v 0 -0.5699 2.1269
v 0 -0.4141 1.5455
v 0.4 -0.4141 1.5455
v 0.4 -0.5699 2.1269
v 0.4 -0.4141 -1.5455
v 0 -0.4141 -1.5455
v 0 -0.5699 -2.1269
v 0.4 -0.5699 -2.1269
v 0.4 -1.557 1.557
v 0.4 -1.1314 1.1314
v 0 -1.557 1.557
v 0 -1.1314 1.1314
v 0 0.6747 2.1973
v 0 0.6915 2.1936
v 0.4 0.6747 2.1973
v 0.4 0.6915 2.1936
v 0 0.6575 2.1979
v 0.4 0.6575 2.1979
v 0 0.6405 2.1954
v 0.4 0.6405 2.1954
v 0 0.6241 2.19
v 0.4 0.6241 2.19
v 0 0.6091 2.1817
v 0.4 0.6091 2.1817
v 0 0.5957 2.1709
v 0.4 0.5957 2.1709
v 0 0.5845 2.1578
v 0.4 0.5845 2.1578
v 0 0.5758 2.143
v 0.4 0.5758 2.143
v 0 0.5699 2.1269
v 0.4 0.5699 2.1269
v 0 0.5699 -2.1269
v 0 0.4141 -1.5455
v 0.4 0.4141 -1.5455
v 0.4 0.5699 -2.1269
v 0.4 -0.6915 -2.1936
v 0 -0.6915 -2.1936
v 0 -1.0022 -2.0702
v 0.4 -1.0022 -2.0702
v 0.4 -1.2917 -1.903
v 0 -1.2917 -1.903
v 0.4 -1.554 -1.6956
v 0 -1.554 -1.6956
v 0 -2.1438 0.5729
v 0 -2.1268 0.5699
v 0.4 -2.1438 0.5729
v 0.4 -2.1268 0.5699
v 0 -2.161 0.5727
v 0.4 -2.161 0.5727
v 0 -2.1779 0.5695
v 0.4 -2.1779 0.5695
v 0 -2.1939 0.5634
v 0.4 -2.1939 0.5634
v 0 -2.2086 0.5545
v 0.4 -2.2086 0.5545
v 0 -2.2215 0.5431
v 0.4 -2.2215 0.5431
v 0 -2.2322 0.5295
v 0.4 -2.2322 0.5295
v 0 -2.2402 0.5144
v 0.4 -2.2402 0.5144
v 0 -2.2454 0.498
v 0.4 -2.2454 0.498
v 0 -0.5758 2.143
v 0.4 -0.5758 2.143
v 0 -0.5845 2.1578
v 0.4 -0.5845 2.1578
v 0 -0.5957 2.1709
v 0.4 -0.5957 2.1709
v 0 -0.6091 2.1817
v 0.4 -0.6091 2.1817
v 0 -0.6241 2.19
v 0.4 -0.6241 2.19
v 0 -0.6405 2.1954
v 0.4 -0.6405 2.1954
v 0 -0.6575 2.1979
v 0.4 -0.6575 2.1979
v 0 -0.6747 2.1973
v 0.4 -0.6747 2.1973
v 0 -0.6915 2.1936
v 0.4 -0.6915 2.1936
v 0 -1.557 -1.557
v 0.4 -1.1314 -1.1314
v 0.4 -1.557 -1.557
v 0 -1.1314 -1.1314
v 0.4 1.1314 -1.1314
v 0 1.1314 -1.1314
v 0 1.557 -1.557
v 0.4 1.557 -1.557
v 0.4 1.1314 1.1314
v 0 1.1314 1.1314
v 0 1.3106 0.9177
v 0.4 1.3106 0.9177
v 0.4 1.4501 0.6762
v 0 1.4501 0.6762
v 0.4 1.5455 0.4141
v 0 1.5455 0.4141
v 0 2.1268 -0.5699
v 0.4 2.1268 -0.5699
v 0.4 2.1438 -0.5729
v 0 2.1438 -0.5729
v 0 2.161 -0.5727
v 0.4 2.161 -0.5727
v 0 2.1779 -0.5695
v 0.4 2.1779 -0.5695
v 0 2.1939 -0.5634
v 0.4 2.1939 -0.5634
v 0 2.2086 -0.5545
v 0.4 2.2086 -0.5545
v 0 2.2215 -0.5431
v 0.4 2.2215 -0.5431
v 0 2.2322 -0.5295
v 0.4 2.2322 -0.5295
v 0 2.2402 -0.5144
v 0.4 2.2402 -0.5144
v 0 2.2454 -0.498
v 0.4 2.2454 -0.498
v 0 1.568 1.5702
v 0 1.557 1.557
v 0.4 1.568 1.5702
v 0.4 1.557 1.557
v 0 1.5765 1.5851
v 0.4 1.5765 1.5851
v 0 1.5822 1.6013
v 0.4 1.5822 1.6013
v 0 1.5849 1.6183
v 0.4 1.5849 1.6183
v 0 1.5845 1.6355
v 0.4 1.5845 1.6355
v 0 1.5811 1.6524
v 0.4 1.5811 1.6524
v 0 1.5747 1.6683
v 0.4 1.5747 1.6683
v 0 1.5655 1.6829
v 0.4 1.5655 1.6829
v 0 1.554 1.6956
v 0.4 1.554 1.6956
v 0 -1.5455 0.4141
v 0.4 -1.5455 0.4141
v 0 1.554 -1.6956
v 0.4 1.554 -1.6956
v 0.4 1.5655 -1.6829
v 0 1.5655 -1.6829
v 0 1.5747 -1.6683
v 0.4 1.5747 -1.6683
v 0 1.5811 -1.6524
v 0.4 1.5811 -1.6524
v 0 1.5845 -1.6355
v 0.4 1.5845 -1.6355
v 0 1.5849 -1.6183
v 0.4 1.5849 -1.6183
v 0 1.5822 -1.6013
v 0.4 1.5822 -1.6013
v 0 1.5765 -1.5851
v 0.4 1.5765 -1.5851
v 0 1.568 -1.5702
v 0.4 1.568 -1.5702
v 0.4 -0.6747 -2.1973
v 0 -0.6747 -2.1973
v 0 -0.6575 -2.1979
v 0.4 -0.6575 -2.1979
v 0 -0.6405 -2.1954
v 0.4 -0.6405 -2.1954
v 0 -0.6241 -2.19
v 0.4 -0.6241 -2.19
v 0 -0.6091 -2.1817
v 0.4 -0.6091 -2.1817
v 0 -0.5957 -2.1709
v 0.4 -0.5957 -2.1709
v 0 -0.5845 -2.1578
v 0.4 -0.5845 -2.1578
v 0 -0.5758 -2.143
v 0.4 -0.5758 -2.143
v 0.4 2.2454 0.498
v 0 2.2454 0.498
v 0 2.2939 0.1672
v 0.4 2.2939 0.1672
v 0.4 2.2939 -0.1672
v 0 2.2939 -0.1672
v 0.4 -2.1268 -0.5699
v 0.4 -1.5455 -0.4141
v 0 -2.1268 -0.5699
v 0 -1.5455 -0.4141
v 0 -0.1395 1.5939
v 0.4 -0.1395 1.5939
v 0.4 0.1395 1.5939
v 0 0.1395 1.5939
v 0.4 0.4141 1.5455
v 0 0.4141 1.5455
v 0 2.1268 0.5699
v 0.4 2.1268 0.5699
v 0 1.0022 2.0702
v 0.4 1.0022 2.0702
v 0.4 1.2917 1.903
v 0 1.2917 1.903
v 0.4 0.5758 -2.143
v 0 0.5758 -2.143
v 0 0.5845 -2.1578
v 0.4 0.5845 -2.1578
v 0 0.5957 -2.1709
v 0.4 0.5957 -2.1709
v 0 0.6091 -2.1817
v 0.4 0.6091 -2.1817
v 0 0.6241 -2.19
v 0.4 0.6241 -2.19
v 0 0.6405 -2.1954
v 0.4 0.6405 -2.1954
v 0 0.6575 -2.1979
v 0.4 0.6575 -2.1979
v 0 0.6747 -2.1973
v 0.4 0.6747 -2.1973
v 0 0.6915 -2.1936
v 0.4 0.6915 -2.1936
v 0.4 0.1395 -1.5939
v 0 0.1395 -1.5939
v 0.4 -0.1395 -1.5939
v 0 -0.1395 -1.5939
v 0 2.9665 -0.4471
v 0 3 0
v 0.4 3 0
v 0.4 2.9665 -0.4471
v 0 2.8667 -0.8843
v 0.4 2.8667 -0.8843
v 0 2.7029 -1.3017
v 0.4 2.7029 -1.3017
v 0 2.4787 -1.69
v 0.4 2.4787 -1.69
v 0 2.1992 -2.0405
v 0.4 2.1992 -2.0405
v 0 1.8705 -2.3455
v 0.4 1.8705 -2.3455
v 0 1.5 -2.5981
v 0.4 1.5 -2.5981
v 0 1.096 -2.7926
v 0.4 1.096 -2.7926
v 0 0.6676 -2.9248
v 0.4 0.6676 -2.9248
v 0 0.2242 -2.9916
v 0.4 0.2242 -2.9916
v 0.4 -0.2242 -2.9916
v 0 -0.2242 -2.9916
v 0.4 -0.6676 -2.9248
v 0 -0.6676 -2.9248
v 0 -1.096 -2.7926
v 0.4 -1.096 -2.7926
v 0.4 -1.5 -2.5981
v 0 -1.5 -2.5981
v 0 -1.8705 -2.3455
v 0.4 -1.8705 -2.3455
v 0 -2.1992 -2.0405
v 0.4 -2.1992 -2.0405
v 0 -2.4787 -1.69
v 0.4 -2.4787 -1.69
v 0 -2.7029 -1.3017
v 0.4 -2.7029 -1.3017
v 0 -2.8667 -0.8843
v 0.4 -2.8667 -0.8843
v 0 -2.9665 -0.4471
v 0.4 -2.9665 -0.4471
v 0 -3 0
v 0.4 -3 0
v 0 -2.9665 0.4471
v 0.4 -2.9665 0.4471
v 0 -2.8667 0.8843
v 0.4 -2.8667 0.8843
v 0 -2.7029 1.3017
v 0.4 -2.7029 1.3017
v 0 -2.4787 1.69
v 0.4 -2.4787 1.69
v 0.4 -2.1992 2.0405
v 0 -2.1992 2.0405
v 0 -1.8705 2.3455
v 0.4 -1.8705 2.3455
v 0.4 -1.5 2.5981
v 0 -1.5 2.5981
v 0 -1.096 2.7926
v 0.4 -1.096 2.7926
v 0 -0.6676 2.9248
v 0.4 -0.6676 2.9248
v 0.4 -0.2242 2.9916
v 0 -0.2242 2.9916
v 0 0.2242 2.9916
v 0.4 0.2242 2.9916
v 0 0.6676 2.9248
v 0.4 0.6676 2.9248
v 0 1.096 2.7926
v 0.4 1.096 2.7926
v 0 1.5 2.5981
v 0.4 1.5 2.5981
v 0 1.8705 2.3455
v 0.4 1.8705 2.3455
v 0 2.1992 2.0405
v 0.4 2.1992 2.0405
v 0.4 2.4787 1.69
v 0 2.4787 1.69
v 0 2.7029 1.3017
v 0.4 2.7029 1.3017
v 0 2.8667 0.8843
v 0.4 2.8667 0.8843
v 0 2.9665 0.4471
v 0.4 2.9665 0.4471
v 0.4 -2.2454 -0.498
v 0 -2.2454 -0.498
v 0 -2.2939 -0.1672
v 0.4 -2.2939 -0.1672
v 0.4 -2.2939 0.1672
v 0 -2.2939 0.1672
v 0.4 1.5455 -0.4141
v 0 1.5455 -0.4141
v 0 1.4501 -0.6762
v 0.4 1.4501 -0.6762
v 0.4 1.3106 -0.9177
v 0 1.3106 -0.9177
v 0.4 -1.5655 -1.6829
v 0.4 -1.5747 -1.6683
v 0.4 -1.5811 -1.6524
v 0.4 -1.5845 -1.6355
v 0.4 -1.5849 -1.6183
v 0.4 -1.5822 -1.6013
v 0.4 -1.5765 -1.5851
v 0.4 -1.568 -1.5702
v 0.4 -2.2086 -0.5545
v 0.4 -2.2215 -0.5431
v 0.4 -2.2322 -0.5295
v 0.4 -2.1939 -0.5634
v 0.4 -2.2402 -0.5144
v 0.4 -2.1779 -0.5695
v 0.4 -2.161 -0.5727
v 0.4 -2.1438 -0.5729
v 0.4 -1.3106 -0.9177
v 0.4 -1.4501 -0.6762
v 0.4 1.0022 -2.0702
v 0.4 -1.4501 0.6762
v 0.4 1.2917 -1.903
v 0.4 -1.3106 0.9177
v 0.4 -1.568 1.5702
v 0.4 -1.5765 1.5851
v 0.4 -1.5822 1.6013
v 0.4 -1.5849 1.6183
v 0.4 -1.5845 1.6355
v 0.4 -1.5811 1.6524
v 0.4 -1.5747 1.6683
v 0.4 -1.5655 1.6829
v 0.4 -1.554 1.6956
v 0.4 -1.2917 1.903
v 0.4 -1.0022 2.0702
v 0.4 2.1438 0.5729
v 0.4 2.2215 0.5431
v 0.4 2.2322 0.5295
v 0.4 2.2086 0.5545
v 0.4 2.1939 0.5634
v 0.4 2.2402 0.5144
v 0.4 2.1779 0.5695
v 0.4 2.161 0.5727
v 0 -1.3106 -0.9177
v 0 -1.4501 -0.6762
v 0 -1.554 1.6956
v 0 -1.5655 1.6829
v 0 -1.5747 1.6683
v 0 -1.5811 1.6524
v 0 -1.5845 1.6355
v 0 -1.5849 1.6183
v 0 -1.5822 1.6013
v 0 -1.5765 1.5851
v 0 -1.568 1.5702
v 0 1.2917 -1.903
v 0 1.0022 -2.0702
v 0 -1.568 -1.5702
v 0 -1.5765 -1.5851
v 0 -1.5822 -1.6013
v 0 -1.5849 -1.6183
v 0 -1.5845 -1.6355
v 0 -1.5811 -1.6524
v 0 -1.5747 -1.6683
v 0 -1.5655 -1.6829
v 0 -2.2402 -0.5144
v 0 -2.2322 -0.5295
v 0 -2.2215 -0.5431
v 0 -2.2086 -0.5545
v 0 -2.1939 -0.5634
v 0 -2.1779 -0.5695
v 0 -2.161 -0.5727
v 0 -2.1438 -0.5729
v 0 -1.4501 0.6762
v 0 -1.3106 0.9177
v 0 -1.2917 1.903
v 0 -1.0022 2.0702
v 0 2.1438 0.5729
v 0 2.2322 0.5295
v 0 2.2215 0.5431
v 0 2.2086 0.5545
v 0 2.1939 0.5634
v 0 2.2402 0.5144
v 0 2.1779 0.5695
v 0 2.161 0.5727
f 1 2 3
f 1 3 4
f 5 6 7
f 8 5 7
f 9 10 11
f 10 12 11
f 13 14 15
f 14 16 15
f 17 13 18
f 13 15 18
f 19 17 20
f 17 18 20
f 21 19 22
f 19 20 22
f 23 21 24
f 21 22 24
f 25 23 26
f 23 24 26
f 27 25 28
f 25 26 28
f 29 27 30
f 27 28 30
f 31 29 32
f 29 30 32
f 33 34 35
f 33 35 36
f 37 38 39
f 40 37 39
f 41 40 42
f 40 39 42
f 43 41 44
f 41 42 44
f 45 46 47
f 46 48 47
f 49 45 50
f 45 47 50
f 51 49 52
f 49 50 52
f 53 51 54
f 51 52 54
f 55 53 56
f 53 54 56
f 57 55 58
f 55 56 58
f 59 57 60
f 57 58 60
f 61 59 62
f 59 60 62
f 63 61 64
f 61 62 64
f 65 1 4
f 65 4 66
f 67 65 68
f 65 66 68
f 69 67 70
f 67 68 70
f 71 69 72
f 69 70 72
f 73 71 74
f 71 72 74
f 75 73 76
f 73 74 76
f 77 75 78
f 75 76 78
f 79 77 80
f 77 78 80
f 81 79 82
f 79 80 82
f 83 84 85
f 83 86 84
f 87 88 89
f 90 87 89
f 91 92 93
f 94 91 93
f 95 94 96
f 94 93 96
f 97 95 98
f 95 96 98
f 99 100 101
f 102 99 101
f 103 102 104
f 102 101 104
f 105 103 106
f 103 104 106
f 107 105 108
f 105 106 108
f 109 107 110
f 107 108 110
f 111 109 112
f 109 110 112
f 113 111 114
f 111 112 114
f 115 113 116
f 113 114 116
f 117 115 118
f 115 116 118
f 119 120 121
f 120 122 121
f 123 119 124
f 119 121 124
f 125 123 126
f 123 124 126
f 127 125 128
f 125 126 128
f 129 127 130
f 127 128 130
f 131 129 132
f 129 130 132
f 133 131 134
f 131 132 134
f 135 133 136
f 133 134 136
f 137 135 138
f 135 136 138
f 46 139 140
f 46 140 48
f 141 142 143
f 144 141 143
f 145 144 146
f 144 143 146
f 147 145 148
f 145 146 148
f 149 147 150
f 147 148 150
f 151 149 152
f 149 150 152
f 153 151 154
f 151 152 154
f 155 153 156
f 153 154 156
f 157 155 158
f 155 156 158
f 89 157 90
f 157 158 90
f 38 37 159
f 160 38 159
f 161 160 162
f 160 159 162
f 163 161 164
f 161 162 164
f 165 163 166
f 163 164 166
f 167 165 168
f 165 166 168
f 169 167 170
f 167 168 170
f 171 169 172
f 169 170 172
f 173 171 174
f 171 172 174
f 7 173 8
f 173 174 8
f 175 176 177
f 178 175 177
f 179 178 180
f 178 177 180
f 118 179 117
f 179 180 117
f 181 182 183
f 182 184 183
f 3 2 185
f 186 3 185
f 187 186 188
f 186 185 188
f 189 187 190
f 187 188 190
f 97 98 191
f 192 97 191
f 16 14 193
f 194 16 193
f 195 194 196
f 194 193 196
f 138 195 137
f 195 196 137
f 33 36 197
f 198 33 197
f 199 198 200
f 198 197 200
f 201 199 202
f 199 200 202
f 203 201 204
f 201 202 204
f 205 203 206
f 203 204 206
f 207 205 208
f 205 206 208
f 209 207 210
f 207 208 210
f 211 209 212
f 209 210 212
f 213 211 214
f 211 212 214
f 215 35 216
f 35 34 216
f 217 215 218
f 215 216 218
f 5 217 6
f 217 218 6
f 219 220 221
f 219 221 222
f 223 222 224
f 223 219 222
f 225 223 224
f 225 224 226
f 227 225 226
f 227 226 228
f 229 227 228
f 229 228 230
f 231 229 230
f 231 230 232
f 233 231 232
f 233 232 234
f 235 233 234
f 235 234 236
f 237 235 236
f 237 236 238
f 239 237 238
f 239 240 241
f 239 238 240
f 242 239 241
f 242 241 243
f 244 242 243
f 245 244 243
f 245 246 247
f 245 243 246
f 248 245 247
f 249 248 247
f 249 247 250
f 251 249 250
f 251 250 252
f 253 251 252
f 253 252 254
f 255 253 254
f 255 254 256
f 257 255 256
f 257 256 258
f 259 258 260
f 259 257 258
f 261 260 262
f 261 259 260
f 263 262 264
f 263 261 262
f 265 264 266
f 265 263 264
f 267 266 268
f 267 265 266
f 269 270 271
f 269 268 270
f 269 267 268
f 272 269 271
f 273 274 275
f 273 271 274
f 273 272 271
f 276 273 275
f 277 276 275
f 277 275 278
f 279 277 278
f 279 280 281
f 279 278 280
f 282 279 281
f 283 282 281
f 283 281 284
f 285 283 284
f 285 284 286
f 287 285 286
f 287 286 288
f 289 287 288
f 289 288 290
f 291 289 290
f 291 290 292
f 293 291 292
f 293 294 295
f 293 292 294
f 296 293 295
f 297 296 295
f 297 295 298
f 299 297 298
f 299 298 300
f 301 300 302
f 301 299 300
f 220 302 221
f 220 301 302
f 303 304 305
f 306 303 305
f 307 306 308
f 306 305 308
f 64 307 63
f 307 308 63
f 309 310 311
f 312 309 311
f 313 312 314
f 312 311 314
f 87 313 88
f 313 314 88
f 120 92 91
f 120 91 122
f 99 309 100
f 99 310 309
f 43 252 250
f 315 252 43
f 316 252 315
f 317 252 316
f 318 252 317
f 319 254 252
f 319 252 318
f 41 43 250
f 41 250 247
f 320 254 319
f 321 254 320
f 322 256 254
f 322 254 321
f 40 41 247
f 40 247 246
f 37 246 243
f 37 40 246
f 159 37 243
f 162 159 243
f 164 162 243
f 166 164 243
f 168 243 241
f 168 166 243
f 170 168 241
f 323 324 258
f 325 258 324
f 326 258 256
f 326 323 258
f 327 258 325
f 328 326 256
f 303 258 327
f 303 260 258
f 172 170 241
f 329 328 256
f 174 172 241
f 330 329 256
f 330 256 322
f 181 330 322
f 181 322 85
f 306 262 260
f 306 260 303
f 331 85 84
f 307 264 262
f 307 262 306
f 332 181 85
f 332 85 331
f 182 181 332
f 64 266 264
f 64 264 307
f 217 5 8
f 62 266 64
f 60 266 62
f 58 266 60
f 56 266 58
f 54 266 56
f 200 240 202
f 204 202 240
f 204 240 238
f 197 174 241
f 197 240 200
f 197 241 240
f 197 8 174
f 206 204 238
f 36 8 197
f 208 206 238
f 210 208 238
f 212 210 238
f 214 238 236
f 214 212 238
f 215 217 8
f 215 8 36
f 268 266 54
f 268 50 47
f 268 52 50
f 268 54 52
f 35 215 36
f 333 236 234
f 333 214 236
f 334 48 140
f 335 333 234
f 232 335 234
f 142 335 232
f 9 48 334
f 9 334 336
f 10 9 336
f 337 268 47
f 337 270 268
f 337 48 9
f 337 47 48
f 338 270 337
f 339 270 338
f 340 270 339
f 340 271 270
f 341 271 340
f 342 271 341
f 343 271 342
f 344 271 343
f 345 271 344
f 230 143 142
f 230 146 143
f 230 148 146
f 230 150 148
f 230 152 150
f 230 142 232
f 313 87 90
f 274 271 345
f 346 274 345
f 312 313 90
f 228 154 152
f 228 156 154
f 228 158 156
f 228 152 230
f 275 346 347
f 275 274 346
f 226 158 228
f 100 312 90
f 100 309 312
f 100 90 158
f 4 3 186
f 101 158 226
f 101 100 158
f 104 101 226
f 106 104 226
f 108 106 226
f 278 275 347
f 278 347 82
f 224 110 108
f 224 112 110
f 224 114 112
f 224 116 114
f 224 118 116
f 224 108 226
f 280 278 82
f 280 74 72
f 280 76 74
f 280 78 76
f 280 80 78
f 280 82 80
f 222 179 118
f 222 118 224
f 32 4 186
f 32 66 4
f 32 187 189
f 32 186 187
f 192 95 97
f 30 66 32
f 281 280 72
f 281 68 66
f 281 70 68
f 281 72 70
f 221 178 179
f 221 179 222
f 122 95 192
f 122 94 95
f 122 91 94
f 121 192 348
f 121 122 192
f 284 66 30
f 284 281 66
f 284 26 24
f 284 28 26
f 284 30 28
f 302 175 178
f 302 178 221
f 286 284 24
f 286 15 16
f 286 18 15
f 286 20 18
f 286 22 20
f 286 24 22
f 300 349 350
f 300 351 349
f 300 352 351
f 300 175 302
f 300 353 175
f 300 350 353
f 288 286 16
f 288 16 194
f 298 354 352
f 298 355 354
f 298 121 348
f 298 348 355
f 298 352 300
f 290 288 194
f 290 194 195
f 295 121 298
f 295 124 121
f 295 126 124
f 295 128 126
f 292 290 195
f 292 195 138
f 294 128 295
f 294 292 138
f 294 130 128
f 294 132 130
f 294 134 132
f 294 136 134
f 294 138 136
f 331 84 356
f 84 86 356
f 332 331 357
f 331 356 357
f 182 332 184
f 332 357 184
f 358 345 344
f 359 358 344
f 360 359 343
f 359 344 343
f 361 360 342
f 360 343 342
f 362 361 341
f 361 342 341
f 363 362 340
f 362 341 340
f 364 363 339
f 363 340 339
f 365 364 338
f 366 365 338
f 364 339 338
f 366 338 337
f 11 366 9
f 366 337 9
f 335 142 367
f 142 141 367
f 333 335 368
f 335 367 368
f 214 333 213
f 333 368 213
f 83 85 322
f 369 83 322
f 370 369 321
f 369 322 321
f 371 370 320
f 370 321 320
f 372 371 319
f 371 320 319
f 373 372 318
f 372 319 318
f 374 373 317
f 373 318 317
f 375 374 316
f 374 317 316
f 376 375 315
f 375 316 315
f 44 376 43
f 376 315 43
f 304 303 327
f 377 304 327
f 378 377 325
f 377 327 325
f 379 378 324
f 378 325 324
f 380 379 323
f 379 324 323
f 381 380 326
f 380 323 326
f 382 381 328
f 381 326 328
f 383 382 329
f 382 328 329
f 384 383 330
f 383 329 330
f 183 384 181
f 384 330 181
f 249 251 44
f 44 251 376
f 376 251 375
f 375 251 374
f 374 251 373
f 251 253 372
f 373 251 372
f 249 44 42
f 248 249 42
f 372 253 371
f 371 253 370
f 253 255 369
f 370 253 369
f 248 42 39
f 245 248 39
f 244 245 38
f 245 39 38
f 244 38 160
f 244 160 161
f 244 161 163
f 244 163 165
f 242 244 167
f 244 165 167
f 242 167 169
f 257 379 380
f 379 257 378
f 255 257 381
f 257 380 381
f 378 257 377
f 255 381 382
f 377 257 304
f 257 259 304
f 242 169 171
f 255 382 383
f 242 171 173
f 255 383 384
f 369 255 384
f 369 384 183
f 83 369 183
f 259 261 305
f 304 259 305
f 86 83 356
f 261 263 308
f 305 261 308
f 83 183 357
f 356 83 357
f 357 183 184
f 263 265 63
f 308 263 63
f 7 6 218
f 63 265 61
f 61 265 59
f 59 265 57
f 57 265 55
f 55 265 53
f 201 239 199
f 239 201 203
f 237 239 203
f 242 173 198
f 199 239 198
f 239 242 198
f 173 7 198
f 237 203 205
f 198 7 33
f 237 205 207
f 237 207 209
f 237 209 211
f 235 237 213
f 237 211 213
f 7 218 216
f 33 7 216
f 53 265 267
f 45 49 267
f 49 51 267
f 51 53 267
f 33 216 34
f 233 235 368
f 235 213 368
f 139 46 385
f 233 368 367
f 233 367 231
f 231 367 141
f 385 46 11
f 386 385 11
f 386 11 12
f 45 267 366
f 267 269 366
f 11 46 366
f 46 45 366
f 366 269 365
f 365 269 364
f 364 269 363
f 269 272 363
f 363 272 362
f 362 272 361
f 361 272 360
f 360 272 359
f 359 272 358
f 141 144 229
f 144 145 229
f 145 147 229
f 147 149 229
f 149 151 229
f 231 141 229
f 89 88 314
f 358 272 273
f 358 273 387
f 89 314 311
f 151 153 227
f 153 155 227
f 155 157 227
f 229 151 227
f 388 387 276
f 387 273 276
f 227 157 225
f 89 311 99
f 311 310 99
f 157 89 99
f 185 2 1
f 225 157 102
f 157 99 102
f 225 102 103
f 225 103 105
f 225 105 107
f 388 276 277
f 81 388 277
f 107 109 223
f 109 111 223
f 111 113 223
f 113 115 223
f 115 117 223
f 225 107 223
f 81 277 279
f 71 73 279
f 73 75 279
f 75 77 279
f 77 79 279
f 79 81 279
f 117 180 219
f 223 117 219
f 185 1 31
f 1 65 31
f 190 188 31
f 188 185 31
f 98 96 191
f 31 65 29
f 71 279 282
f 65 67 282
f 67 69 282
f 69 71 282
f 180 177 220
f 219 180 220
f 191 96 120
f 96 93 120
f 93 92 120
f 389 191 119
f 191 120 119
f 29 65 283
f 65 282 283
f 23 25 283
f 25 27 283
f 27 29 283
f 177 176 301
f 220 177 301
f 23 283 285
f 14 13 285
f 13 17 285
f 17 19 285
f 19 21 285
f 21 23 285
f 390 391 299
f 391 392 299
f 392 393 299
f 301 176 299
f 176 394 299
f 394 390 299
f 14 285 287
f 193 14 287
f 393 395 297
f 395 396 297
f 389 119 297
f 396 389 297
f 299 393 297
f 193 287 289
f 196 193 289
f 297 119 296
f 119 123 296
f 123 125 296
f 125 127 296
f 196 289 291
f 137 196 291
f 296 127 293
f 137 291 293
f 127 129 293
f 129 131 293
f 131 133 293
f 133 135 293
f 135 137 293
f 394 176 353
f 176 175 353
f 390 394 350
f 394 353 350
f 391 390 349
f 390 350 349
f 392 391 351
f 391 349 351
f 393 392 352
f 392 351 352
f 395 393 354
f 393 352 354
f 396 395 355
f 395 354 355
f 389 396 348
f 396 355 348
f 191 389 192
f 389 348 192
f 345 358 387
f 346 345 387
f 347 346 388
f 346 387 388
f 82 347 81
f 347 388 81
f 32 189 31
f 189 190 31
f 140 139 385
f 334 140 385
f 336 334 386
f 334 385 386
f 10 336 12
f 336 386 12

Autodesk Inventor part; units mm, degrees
ref_plane "YZ Plane" through (0, 0, 0) normal (1, 0, 0) x (0, 1, 0)
ref_plane "XZ Plane" through (0, 0, 0) normal (0, 1, 0) x (-1, 0, 0)
sketch "Sketch1" plane through (0, 0, 0) normal (1, 0, 0) x (0, 1, 0)
  circle A0 centre (0, 0) radius 3
  circle A1 centre (0, 0) radius 1.6
  dimension "d0" = 6
  dimension "d1" = 3.2
extrude "Body" add sketch "Sketch1" along normal blind 0.4
sketch "Sketch2" plane through (0, 0, 0) normal (-1, 0, 0) x (0, 0, 1)
  circle A0 centre (0, 0) radius 1.6 projected
  circle A1 centre (0, 0) radius 3 projected
  arc A2 (0.5953, 2.2216) -> (-0.5953, 2.2216) centre (0, 0) ccw
  line L0 (-0.4141, 1.5455) -> (-0.5953, 2.2216)
  line L1 (0, 0) -> (0, 2.3) construction
  line L2 (0.4141, 1.5455) -> (0.5953, 2.2216)
  line L3 (-0.4141, 1.5455) -> (0, 0) construction
  line L4 (0.4141, 1.5455) -> (0, 0) construction
  dimension "d4" = 4.6
  dimension "d5" = 15
extrude "Cut" cut sketch "Sketch2" against normal blind 0.4 contours A0 L0 A2 L2
fillet "Fillet1" radius 0.096 2 edges at (0.2, 2.2216, 0.5953) (0.2, 2.2216, -0.5953)
pattern_circular "Cuts" count 6 over 360 about axis through (-10, 0, 0) along (1, 0, 0) of "Cut", "Fillet1"
ref_plane "Work Plane1" through (0, 0, 0) normal (0, 1, 0) x (1, 0, 0)
equation "\"d0\" = SD2"
equation "\"d1\" = SD1"
equation "\"d2\" = SD"
equation "\"d4\" = 0.5 * SD2 + 0.5 * SD1"
equation "\"d6\" = SD"
equation "\"d8\" = 0.03 * SD1"
equation "\"SD1\" = 3.2"
equation "\"SD2\" = 6"
equation "\"SD\" = 0.4"
equation "\"NND\" = 3"
properties part number "IS 5371 - B3.2" material "Steel, Mild"
